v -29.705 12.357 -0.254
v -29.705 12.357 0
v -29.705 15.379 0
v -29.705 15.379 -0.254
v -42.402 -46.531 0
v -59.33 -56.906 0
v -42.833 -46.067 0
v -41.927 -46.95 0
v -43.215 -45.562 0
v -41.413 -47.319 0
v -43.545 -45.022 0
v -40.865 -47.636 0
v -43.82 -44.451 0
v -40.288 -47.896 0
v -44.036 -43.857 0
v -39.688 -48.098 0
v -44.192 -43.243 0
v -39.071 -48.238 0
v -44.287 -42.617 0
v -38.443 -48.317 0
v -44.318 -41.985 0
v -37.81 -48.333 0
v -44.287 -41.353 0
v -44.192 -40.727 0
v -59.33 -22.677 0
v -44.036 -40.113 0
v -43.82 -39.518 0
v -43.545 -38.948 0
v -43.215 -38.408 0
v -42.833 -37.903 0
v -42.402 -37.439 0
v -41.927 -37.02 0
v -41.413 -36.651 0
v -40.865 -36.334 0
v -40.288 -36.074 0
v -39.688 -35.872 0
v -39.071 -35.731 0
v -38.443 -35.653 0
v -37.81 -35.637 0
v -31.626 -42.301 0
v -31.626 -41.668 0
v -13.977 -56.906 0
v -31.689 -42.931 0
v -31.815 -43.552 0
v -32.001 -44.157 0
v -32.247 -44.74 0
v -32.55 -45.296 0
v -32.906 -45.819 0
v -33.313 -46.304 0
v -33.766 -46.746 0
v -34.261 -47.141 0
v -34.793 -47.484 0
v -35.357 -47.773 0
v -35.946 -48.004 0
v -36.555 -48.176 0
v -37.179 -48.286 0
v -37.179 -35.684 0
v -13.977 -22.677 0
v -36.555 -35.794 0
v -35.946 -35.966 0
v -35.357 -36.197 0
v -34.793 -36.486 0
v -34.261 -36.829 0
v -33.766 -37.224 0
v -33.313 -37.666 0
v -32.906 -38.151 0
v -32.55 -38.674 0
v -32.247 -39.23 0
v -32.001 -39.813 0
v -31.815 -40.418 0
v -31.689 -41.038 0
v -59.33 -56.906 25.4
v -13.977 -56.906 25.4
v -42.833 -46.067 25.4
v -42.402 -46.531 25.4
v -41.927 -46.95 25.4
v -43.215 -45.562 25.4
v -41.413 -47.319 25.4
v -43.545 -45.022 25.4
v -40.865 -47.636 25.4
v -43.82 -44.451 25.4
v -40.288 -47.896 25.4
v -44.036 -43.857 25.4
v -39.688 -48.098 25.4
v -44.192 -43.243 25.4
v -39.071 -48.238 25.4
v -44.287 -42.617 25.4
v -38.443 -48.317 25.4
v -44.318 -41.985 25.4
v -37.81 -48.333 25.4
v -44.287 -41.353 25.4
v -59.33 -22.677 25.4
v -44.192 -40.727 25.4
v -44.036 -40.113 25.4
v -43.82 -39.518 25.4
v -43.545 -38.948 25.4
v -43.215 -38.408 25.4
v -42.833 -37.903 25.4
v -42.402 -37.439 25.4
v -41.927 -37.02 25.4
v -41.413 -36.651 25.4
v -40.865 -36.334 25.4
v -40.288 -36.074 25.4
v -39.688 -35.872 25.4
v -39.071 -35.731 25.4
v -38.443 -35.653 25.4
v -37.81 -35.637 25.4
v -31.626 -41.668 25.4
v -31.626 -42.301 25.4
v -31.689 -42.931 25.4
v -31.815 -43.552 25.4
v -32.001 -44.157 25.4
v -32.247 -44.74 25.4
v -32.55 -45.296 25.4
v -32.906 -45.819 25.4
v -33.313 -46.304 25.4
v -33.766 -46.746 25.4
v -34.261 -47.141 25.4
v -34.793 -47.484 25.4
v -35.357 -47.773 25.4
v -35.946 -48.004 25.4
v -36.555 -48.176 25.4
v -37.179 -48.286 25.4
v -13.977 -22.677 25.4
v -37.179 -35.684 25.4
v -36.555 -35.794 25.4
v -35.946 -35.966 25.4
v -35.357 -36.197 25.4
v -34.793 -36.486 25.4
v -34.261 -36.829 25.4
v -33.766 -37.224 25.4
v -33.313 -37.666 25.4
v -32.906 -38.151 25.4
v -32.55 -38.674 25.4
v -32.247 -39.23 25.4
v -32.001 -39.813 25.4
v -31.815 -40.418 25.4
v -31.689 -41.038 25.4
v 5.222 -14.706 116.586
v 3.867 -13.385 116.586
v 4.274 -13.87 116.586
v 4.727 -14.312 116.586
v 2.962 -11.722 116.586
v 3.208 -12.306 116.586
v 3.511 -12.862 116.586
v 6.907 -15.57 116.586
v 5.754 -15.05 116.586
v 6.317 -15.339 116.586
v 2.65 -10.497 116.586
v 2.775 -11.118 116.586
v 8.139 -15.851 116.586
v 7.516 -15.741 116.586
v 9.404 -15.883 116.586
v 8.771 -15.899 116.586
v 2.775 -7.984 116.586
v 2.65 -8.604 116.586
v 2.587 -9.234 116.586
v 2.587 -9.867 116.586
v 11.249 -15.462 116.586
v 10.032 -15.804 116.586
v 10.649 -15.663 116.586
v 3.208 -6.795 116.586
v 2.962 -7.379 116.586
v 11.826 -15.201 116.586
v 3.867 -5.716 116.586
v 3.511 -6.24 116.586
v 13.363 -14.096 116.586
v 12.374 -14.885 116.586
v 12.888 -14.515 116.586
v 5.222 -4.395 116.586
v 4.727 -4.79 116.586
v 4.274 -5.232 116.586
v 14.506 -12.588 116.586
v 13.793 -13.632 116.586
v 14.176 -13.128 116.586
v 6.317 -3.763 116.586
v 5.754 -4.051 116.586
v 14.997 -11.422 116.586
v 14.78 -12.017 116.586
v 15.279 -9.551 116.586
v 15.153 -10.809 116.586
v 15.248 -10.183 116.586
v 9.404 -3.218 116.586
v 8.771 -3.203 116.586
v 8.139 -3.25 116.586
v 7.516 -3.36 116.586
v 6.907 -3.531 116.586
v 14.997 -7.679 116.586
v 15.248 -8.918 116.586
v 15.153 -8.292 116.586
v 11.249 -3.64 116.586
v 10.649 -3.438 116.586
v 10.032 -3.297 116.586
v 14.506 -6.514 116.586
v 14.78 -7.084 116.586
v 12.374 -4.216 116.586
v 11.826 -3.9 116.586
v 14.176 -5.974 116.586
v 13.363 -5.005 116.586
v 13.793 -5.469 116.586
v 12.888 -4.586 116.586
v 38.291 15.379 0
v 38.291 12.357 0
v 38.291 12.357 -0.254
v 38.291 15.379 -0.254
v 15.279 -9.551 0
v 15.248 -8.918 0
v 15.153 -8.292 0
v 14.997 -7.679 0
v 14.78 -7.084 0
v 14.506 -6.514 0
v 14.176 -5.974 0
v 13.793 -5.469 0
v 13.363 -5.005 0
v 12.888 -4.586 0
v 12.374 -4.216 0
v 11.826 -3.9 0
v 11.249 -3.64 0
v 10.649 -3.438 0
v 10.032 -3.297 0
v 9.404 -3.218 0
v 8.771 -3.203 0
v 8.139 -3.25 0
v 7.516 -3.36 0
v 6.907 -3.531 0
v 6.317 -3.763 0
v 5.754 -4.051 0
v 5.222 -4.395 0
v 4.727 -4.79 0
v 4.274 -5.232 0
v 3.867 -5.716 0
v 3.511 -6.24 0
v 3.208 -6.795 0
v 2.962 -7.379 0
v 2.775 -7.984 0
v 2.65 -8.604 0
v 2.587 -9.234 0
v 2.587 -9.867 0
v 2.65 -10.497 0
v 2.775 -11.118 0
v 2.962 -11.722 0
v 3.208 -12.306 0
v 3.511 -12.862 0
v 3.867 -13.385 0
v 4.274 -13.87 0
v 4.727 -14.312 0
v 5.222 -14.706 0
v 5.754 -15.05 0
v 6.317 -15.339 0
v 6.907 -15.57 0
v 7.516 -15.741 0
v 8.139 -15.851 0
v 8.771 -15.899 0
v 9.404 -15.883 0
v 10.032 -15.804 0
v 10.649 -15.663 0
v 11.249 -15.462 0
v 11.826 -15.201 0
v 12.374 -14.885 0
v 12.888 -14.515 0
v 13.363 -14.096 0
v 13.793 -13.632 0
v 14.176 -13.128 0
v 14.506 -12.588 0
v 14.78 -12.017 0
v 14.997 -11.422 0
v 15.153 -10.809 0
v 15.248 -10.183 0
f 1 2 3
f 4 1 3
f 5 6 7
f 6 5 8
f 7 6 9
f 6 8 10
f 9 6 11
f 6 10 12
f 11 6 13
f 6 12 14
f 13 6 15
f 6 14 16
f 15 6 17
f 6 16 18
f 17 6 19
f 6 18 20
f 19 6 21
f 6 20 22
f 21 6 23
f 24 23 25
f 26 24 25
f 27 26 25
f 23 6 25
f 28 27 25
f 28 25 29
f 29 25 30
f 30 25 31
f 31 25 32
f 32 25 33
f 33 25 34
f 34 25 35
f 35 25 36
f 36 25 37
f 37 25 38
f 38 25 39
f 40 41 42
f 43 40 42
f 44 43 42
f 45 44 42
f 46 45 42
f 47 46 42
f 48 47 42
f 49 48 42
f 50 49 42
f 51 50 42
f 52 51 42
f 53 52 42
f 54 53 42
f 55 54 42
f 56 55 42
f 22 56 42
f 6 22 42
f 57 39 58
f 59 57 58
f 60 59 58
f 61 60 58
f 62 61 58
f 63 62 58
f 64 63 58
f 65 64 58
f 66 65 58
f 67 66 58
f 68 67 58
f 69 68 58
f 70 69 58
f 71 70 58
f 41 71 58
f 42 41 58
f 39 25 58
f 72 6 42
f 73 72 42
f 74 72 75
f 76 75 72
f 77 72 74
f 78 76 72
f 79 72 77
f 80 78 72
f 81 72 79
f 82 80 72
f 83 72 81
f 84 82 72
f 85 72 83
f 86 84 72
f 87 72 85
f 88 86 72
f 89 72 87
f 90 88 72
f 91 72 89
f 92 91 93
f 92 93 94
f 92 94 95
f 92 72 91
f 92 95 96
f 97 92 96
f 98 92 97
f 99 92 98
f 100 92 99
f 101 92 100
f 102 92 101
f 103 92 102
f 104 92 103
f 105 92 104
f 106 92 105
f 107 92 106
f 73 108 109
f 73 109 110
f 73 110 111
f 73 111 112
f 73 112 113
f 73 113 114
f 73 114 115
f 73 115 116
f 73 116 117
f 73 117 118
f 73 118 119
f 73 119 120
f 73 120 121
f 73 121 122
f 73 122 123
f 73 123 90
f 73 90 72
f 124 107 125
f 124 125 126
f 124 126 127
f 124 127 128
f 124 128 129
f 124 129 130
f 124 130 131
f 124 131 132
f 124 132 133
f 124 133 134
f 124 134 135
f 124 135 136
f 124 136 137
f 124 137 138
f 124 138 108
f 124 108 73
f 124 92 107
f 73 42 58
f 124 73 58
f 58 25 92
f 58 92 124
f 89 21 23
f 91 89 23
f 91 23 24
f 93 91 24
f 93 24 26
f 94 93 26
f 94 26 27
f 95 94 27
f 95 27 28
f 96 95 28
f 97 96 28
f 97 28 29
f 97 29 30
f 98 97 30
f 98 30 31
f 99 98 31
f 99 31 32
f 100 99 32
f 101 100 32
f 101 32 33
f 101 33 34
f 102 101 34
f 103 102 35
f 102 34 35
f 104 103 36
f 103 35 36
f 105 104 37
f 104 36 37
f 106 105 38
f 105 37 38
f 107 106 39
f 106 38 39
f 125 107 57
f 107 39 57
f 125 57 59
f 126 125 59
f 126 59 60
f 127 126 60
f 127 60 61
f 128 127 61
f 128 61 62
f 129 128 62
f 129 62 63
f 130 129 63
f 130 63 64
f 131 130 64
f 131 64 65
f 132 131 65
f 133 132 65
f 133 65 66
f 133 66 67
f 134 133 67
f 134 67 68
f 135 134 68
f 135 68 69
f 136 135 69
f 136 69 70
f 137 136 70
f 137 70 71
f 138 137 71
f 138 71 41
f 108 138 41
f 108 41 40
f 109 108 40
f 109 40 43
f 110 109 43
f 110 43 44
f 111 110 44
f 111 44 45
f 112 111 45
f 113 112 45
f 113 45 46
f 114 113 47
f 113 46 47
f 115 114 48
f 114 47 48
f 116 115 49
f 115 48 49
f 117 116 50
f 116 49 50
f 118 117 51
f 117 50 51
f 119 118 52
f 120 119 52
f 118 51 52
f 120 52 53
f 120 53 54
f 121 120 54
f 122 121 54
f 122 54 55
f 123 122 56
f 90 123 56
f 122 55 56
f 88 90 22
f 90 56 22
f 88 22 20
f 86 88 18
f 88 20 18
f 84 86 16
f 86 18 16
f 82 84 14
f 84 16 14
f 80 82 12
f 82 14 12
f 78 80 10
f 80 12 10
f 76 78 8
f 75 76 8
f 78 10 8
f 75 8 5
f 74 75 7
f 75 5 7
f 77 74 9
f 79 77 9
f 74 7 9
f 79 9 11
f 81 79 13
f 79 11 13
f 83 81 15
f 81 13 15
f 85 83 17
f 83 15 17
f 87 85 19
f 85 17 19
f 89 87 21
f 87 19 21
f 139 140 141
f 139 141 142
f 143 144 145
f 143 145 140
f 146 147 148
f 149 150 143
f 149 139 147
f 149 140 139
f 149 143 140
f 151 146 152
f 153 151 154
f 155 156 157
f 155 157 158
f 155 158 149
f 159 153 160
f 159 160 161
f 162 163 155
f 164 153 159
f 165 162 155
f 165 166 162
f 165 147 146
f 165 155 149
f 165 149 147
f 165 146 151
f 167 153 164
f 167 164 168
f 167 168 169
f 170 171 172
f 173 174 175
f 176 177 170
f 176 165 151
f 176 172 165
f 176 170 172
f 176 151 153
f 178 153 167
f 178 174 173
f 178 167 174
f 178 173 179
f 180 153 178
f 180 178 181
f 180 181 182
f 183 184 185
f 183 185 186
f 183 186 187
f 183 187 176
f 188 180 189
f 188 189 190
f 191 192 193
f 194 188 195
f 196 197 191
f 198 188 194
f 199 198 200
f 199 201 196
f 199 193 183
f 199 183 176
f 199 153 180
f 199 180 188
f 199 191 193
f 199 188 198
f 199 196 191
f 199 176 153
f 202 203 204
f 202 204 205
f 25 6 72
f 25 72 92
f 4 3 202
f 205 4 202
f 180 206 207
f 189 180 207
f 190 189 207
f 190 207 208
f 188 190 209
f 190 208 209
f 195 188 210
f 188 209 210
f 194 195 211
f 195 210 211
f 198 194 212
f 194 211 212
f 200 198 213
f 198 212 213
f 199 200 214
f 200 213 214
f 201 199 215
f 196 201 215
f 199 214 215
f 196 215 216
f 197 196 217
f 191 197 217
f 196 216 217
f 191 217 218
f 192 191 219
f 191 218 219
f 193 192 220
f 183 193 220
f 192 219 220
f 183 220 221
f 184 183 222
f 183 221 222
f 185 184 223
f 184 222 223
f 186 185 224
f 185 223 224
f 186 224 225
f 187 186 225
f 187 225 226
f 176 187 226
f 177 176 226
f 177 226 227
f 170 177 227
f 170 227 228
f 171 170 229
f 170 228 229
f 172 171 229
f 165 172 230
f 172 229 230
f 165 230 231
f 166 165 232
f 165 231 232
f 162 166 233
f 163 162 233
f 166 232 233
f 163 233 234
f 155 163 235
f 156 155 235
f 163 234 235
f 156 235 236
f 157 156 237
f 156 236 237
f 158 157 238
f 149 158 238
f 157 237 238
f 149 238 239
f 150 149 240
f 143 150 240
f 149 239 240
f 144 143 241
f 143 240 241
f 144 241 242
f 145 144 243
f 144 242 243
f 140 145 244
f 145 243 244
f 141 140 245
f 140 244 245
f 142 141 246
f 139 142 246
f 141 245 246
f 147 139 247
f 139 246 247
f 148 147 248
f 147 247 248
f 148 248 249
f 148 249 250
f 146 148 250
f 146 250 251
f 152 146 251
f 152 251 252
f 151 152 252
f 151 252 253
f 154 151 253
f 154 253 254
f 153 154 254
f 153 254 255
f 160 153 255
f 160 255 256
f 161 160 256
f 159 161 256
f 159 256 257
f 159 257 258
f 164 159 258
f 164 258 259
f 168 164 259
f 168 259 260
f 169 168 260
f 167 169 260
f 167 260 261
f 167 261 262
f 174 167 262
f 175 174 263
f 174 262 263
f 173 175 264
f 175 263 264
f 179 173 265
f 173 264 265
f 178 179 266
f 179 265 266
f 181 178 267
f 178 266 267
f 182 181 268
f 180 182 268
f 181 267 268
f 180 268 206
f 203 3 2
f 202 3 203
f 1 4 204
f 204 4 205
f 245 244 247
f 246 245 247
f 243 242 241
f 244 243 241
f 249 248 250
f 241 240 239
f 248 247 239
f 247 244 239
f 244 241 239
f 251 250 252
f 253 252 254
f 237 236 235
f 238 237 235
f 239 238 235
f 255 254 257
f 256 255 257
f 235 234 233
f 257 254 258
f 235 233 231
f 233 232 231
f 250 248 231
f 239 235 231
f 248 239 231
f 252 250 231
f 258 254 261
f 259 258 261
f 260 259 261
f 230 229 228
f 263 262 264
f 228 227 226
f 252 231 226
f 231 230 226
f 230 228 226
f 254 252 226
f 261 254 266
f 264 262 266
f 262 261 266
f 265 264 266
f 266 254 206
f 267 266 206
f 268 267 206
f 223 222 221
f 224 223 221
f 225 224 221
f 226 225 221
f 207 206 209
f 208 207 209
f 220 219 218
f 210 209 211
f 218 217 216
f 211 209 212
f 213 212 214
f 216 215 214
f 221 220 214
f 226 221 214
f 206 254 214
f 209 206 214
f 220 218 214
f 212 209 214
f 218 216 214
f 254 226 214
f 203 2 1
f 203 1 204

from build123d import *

# Parameters (mm, degrees)
F0_W     = 67.995434
F0_H     = 3.022018
F1_DEPTH = 0.254
F2_W     = 45.353265
F2_H     = 34.228876
F3_DEPTH = 25.4
F5_D     = 12.7
F6_R     = 6.35
F7_DEPTH = 116.586


with BuildPart() as f1:
    # F0 (on Top) → F1 (new body)
    with BuildSketch(Plane.XY):
        with Locations((4.292925, 13.867795)):
            Rectangle(F0_W, F0_H)
    extrude(amount=-F1_DEPTH)


with BuildPart() as f3:
    # F2 (on Top) → F3 (new body)
    with BuildSketch(Plane.XY):
        with Locations((-36.653424, -39.79107)):
            Rectangle(F2_W, F2_H)
    extrude(amount=F3_DEPTH)

    # F5 (through all)
    with Locations(Plane.XY.offset(25.4)):
        with Locations((-37.968174, -41.984908)):
            Hole(F5_D / 2)


with BuildPart() as f7:
    # F6 (on Top) → F7 (new body)
    with BuildSketch(Plane.XY):
        with Locations((8.929071, -9.550638)):
            Circle(F6_R)
    extrude(amount=F7_DEPTH)


solid = Compound([f1.part, f3.part, f7.part])
